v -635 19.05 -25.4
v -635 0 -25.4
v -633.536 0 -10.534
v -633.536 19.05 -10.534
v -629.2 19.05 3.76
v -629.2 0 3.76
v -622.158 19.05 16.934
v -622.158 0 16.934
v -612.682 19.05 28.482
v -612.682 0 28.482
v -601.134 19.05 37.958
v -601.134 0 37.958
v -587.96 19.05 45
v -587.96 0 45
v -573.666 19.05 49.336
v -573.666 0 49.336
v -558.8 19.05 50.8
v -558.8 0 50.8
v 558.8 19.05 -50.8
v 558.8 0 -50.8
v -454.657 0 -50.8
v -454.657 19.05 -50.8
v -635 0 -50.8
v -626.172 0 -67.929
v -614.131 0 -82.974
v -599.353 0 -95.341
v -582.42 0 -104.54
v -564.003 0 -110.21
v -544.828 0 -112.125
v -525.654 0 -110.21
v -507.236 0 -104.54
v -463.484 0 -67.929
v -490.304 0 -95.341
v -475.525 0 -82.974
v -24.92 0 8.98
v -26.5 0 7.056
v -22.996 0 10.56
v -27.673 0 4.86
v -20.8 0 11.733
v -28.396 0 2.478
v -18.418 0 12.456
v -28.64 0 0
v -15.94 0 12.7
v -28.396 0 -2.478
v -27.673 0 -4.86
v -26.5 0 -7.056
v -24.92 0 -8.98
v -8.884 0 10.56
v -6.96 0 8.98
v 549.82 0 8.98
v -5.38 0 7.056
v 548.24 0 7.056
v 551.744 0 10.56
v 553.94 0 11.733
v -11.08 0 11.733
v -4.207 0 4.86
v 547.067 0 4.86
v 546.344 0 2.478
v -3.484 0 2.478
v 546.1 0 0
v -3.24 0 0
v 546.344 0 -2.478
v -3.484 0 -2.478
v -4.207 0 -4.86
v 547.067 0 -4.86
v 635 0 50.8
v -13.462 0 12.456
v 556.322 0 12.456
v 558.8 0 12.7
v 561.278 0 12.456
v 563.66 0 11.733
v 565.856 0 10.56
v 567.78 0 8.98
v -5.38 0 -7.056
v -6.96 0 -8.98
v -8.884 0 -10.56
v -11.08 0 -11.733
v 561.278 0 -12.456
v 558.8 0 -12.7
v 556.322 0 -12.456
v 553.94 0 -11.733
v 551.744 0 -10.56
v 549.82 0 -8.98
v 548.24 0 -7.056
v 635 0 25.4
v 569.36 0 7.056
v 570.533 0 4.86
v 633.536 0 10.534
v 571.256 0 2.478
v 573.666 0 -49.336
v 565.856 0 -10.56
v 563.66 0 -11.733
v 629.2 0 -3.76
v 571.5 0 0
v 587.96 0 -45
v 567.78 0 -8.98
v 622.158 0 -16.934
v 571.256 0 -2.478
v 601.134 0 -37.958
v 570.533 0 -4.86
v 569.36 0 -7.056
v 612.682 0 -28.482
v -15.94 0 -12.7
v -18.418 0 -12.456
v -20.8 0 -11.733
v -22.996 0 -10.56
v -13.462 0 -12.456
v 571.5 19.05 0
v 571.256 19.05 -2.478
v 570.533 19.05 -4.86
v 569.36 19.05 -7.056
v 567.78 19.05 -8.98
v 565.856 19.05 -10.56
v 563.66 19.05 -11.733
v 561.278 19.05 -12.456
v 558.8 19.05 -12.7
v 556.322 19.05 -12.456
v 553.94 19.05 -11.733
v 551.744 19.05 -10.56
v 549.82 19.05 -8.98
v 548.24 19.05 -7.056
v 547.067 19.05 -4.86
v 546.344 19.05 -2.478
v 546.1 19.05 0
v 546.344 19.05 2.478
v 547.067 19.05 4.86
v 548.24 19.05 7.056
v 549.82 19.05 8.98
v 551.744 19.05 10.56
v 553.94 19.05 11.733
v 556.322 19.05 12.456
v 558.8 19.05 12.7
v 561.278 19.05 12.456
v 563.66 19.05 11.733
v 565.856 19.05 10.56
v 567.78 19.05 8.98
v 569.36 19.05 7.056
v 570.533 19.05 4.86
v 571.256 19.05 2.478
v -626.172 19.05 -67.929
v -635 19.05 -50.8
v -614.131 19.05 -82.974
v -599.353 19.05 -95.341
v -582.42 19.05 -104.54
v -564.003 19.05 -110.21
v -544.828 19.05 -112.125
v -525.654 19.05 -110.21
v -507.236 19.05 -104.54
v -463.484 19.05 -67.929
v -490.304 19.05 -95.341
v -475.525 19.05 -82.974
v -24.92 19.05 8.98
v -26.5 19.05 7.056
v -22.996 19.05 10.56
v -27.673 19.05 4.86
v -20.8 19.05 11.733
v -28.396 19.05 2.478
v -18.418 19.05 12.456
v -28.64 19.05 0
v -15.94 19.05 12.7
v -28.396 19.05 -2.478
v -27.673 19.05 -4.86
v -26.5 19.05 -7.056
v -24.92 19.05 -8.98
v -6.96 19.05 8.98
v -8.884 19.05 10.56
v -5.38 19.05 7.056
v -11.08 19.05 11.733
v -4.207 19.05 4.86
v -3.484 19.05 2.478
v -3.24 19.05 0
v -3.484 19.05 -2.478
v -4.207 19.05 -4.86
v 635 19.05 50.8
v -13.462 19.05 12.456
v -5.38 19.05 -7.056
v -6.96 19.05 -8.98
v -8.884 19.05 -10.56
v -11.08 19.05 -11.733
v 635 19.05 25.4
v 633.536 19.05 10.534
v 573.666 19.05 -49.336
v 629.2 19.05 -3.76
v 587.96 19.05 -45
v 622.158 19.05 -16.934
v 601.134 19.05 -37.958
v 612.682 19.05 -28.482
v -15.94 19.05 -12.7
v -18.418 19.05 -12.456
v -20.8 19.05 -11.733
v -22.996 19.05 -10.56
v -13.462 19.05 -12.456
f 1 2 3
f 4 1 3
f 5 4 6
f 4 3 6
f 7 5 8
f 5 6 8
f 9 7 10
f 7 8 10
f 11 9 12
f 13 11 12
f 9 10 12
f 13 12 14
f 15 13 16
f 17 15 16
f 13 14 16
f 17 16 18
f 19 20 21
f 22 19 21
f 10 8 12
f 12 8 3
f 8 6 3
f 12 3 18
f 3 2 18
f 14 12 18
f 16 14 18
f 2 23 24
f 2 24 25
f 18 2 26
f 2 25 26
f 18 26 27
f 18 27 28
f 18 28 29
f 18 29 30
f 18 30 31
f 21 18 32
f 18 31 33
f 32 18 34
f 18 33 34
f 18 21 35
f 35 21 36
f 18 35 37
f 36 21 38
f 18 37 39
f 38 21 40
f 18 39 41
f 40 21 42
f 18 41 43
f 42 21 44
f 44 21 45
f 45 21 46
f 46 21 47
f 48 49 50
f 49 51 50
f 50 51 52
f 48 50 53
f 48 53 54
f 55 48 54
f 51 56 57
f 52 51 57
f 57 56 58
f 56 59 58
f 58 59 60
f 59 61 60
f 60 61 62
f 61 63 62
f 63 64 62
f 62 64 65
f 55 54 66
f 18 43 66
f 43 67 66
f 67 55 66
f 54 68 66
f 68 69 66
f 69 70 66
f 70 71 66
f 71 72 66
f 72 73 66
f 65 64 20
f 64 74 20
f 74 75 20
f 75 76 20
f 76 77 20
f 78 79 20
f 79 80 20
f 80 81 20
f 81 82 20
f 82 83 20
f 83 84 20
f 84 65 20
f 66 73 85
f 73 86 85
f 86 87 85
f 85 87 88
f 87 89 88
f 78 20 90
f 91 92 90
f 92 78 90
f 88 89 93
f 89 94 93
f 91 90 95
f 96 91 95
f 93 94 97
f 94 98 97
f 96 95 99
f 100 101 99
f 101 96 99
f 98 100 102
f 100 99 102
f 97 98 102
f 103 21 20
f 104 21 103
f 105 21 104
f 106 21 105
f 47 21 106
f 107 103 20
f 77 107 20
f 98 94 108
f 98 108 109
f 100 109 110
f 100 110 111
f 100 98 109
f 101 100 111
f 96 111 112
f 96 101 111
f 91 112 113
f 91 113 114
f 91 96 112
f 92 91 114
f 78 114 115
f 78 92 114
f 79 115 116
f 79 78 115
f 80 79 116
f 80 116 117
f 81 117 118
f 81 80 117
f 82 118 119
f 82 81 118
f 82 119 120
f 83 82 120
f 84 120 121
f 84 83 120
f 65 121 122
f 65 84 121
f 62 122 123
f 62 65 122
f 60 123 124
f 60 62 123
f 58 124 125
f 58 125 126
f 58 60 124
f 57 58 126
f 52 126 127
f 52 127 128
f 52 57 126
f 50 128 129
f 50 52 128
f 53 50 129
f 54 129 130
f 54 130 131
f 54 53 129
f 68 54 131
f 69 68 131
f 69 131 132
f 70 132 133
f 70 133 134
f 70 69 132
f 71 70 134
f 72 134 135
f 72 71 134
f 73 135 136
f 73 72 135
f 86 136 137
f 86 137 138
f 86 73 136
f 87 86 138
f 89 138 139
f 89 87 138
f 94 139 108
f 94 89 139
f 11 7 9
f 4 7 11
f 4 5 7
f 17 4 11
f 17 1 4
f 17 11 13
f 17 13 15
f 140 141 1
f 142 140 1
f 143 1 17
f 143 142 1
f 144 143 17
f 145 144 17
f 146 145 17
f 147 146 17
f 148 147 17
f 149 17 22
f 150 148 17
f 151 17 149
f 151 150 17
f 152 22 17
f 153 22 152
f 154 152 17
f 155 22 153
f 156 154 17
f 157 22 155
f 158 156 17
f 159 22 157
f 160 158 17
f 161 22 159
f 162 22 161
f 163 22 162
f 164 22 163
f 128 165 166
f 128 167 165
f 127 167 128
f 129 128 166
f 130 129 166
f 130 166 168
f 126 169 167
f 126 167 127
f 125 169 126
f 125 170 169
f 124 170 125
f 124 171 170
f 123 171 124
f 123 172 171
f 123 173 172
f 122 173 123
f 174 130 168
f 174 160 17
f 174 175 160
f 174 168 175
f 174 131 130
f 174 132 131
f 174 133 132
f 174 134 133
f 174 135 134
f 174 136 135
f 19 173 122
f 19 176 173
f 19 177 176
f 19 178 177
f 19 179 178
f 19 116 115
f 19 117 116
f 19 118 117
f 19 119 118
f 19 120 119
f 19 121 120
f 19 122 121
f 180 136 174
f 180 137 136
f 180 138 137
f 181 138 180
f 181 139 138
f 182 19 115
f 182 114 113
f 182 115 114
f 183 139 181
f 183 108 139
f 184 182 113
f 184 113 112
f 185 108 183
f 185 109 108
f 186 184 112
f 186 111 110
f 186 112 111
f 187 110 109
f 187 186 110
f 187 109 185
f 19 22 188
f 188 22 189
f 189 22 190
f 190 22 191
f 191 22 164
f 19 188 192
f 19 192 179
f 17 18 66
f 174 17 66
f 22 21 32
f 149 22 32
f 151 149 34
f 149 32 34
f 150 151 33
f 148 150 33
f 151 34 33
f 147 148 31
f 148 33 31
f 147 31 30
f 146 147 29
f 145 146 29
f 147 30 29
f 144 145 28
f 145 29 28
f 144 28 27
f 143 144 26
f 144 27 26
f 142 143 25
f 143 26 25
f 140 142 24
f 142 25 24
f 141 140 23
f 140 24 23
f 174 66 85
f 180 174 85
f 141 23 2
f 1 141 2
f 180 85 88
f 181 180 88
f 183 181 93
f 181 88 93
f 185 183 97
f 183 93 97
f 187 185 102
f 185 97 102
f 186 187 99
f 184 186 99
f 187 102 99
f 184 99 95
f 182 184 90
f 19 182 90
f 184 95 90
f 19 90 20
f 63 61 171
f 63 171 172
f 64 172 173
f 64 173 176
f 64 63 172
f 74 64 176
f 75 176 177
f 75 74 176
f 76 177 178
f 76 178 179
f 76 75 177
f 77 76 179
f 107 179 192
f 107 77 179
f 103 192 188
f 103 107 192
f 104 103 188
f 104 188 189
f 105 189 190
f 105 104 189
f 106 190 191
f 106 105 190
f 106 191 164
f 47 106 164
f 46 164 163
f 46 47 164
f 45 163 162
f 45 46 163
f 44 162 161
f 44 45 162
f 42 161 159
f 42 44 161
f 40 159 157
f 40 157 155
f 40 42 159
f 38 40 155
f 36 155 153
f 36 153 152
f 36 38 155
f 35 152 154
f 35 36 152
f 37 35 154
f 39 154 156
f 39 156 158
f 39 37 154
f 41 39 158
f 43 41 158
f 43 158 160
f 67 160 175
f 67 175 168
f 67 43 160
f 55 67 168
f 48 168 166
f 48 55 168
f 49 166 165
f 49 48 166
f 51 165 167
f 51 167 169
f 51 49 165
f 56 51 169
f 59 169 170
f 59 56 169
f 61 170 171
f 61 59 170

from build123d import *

# Parameters (mm, degrees)
SKETCH1_R           = 12.7
BOSS_EXTRUDE1_DEPTH = 19.05


with BuildPart() as part:
    # Sketch1 → Boss-Extrude1 (new body)
    with BuildSketch(Plane(origin=(0, 0, 0), x_dir=(1, 0, 0), z_dir=(0, 1, 0))):
        with BuildLine():
            Line((-558.8, -50.8), (635, -50.8))
            Line((635, -50.8), (635, -25.4))
            ThreePointArc((635, -25.4), (612.681536726, 28.481536726), (558.8, 50.8))
            Line((558.8, 50.8), (-454.65655736, 50.8))
            ThreePointArc((-454.65655736, 50.8), (-544.82827868, 112.124515873), (-635, 50.8))
            Line((-635, 50.8), (-635, 25.4))
            ThreePointArc((-635, 25.4), (-612.681536726, -28.481536726), (-558.8, -50.8))
        make_face()
        with Locations((-15.94, 0)):
            Circle(SKETCH1_R, mode=Mode.SUBTRACT)
        with Locations((558.8, 0)):
            Circle(SKETCH1_R, mode=Mode.SUBTRACT)
    extrude(amount=BOSS_EXTRUDE1_DEPTH)


solid = part.part
